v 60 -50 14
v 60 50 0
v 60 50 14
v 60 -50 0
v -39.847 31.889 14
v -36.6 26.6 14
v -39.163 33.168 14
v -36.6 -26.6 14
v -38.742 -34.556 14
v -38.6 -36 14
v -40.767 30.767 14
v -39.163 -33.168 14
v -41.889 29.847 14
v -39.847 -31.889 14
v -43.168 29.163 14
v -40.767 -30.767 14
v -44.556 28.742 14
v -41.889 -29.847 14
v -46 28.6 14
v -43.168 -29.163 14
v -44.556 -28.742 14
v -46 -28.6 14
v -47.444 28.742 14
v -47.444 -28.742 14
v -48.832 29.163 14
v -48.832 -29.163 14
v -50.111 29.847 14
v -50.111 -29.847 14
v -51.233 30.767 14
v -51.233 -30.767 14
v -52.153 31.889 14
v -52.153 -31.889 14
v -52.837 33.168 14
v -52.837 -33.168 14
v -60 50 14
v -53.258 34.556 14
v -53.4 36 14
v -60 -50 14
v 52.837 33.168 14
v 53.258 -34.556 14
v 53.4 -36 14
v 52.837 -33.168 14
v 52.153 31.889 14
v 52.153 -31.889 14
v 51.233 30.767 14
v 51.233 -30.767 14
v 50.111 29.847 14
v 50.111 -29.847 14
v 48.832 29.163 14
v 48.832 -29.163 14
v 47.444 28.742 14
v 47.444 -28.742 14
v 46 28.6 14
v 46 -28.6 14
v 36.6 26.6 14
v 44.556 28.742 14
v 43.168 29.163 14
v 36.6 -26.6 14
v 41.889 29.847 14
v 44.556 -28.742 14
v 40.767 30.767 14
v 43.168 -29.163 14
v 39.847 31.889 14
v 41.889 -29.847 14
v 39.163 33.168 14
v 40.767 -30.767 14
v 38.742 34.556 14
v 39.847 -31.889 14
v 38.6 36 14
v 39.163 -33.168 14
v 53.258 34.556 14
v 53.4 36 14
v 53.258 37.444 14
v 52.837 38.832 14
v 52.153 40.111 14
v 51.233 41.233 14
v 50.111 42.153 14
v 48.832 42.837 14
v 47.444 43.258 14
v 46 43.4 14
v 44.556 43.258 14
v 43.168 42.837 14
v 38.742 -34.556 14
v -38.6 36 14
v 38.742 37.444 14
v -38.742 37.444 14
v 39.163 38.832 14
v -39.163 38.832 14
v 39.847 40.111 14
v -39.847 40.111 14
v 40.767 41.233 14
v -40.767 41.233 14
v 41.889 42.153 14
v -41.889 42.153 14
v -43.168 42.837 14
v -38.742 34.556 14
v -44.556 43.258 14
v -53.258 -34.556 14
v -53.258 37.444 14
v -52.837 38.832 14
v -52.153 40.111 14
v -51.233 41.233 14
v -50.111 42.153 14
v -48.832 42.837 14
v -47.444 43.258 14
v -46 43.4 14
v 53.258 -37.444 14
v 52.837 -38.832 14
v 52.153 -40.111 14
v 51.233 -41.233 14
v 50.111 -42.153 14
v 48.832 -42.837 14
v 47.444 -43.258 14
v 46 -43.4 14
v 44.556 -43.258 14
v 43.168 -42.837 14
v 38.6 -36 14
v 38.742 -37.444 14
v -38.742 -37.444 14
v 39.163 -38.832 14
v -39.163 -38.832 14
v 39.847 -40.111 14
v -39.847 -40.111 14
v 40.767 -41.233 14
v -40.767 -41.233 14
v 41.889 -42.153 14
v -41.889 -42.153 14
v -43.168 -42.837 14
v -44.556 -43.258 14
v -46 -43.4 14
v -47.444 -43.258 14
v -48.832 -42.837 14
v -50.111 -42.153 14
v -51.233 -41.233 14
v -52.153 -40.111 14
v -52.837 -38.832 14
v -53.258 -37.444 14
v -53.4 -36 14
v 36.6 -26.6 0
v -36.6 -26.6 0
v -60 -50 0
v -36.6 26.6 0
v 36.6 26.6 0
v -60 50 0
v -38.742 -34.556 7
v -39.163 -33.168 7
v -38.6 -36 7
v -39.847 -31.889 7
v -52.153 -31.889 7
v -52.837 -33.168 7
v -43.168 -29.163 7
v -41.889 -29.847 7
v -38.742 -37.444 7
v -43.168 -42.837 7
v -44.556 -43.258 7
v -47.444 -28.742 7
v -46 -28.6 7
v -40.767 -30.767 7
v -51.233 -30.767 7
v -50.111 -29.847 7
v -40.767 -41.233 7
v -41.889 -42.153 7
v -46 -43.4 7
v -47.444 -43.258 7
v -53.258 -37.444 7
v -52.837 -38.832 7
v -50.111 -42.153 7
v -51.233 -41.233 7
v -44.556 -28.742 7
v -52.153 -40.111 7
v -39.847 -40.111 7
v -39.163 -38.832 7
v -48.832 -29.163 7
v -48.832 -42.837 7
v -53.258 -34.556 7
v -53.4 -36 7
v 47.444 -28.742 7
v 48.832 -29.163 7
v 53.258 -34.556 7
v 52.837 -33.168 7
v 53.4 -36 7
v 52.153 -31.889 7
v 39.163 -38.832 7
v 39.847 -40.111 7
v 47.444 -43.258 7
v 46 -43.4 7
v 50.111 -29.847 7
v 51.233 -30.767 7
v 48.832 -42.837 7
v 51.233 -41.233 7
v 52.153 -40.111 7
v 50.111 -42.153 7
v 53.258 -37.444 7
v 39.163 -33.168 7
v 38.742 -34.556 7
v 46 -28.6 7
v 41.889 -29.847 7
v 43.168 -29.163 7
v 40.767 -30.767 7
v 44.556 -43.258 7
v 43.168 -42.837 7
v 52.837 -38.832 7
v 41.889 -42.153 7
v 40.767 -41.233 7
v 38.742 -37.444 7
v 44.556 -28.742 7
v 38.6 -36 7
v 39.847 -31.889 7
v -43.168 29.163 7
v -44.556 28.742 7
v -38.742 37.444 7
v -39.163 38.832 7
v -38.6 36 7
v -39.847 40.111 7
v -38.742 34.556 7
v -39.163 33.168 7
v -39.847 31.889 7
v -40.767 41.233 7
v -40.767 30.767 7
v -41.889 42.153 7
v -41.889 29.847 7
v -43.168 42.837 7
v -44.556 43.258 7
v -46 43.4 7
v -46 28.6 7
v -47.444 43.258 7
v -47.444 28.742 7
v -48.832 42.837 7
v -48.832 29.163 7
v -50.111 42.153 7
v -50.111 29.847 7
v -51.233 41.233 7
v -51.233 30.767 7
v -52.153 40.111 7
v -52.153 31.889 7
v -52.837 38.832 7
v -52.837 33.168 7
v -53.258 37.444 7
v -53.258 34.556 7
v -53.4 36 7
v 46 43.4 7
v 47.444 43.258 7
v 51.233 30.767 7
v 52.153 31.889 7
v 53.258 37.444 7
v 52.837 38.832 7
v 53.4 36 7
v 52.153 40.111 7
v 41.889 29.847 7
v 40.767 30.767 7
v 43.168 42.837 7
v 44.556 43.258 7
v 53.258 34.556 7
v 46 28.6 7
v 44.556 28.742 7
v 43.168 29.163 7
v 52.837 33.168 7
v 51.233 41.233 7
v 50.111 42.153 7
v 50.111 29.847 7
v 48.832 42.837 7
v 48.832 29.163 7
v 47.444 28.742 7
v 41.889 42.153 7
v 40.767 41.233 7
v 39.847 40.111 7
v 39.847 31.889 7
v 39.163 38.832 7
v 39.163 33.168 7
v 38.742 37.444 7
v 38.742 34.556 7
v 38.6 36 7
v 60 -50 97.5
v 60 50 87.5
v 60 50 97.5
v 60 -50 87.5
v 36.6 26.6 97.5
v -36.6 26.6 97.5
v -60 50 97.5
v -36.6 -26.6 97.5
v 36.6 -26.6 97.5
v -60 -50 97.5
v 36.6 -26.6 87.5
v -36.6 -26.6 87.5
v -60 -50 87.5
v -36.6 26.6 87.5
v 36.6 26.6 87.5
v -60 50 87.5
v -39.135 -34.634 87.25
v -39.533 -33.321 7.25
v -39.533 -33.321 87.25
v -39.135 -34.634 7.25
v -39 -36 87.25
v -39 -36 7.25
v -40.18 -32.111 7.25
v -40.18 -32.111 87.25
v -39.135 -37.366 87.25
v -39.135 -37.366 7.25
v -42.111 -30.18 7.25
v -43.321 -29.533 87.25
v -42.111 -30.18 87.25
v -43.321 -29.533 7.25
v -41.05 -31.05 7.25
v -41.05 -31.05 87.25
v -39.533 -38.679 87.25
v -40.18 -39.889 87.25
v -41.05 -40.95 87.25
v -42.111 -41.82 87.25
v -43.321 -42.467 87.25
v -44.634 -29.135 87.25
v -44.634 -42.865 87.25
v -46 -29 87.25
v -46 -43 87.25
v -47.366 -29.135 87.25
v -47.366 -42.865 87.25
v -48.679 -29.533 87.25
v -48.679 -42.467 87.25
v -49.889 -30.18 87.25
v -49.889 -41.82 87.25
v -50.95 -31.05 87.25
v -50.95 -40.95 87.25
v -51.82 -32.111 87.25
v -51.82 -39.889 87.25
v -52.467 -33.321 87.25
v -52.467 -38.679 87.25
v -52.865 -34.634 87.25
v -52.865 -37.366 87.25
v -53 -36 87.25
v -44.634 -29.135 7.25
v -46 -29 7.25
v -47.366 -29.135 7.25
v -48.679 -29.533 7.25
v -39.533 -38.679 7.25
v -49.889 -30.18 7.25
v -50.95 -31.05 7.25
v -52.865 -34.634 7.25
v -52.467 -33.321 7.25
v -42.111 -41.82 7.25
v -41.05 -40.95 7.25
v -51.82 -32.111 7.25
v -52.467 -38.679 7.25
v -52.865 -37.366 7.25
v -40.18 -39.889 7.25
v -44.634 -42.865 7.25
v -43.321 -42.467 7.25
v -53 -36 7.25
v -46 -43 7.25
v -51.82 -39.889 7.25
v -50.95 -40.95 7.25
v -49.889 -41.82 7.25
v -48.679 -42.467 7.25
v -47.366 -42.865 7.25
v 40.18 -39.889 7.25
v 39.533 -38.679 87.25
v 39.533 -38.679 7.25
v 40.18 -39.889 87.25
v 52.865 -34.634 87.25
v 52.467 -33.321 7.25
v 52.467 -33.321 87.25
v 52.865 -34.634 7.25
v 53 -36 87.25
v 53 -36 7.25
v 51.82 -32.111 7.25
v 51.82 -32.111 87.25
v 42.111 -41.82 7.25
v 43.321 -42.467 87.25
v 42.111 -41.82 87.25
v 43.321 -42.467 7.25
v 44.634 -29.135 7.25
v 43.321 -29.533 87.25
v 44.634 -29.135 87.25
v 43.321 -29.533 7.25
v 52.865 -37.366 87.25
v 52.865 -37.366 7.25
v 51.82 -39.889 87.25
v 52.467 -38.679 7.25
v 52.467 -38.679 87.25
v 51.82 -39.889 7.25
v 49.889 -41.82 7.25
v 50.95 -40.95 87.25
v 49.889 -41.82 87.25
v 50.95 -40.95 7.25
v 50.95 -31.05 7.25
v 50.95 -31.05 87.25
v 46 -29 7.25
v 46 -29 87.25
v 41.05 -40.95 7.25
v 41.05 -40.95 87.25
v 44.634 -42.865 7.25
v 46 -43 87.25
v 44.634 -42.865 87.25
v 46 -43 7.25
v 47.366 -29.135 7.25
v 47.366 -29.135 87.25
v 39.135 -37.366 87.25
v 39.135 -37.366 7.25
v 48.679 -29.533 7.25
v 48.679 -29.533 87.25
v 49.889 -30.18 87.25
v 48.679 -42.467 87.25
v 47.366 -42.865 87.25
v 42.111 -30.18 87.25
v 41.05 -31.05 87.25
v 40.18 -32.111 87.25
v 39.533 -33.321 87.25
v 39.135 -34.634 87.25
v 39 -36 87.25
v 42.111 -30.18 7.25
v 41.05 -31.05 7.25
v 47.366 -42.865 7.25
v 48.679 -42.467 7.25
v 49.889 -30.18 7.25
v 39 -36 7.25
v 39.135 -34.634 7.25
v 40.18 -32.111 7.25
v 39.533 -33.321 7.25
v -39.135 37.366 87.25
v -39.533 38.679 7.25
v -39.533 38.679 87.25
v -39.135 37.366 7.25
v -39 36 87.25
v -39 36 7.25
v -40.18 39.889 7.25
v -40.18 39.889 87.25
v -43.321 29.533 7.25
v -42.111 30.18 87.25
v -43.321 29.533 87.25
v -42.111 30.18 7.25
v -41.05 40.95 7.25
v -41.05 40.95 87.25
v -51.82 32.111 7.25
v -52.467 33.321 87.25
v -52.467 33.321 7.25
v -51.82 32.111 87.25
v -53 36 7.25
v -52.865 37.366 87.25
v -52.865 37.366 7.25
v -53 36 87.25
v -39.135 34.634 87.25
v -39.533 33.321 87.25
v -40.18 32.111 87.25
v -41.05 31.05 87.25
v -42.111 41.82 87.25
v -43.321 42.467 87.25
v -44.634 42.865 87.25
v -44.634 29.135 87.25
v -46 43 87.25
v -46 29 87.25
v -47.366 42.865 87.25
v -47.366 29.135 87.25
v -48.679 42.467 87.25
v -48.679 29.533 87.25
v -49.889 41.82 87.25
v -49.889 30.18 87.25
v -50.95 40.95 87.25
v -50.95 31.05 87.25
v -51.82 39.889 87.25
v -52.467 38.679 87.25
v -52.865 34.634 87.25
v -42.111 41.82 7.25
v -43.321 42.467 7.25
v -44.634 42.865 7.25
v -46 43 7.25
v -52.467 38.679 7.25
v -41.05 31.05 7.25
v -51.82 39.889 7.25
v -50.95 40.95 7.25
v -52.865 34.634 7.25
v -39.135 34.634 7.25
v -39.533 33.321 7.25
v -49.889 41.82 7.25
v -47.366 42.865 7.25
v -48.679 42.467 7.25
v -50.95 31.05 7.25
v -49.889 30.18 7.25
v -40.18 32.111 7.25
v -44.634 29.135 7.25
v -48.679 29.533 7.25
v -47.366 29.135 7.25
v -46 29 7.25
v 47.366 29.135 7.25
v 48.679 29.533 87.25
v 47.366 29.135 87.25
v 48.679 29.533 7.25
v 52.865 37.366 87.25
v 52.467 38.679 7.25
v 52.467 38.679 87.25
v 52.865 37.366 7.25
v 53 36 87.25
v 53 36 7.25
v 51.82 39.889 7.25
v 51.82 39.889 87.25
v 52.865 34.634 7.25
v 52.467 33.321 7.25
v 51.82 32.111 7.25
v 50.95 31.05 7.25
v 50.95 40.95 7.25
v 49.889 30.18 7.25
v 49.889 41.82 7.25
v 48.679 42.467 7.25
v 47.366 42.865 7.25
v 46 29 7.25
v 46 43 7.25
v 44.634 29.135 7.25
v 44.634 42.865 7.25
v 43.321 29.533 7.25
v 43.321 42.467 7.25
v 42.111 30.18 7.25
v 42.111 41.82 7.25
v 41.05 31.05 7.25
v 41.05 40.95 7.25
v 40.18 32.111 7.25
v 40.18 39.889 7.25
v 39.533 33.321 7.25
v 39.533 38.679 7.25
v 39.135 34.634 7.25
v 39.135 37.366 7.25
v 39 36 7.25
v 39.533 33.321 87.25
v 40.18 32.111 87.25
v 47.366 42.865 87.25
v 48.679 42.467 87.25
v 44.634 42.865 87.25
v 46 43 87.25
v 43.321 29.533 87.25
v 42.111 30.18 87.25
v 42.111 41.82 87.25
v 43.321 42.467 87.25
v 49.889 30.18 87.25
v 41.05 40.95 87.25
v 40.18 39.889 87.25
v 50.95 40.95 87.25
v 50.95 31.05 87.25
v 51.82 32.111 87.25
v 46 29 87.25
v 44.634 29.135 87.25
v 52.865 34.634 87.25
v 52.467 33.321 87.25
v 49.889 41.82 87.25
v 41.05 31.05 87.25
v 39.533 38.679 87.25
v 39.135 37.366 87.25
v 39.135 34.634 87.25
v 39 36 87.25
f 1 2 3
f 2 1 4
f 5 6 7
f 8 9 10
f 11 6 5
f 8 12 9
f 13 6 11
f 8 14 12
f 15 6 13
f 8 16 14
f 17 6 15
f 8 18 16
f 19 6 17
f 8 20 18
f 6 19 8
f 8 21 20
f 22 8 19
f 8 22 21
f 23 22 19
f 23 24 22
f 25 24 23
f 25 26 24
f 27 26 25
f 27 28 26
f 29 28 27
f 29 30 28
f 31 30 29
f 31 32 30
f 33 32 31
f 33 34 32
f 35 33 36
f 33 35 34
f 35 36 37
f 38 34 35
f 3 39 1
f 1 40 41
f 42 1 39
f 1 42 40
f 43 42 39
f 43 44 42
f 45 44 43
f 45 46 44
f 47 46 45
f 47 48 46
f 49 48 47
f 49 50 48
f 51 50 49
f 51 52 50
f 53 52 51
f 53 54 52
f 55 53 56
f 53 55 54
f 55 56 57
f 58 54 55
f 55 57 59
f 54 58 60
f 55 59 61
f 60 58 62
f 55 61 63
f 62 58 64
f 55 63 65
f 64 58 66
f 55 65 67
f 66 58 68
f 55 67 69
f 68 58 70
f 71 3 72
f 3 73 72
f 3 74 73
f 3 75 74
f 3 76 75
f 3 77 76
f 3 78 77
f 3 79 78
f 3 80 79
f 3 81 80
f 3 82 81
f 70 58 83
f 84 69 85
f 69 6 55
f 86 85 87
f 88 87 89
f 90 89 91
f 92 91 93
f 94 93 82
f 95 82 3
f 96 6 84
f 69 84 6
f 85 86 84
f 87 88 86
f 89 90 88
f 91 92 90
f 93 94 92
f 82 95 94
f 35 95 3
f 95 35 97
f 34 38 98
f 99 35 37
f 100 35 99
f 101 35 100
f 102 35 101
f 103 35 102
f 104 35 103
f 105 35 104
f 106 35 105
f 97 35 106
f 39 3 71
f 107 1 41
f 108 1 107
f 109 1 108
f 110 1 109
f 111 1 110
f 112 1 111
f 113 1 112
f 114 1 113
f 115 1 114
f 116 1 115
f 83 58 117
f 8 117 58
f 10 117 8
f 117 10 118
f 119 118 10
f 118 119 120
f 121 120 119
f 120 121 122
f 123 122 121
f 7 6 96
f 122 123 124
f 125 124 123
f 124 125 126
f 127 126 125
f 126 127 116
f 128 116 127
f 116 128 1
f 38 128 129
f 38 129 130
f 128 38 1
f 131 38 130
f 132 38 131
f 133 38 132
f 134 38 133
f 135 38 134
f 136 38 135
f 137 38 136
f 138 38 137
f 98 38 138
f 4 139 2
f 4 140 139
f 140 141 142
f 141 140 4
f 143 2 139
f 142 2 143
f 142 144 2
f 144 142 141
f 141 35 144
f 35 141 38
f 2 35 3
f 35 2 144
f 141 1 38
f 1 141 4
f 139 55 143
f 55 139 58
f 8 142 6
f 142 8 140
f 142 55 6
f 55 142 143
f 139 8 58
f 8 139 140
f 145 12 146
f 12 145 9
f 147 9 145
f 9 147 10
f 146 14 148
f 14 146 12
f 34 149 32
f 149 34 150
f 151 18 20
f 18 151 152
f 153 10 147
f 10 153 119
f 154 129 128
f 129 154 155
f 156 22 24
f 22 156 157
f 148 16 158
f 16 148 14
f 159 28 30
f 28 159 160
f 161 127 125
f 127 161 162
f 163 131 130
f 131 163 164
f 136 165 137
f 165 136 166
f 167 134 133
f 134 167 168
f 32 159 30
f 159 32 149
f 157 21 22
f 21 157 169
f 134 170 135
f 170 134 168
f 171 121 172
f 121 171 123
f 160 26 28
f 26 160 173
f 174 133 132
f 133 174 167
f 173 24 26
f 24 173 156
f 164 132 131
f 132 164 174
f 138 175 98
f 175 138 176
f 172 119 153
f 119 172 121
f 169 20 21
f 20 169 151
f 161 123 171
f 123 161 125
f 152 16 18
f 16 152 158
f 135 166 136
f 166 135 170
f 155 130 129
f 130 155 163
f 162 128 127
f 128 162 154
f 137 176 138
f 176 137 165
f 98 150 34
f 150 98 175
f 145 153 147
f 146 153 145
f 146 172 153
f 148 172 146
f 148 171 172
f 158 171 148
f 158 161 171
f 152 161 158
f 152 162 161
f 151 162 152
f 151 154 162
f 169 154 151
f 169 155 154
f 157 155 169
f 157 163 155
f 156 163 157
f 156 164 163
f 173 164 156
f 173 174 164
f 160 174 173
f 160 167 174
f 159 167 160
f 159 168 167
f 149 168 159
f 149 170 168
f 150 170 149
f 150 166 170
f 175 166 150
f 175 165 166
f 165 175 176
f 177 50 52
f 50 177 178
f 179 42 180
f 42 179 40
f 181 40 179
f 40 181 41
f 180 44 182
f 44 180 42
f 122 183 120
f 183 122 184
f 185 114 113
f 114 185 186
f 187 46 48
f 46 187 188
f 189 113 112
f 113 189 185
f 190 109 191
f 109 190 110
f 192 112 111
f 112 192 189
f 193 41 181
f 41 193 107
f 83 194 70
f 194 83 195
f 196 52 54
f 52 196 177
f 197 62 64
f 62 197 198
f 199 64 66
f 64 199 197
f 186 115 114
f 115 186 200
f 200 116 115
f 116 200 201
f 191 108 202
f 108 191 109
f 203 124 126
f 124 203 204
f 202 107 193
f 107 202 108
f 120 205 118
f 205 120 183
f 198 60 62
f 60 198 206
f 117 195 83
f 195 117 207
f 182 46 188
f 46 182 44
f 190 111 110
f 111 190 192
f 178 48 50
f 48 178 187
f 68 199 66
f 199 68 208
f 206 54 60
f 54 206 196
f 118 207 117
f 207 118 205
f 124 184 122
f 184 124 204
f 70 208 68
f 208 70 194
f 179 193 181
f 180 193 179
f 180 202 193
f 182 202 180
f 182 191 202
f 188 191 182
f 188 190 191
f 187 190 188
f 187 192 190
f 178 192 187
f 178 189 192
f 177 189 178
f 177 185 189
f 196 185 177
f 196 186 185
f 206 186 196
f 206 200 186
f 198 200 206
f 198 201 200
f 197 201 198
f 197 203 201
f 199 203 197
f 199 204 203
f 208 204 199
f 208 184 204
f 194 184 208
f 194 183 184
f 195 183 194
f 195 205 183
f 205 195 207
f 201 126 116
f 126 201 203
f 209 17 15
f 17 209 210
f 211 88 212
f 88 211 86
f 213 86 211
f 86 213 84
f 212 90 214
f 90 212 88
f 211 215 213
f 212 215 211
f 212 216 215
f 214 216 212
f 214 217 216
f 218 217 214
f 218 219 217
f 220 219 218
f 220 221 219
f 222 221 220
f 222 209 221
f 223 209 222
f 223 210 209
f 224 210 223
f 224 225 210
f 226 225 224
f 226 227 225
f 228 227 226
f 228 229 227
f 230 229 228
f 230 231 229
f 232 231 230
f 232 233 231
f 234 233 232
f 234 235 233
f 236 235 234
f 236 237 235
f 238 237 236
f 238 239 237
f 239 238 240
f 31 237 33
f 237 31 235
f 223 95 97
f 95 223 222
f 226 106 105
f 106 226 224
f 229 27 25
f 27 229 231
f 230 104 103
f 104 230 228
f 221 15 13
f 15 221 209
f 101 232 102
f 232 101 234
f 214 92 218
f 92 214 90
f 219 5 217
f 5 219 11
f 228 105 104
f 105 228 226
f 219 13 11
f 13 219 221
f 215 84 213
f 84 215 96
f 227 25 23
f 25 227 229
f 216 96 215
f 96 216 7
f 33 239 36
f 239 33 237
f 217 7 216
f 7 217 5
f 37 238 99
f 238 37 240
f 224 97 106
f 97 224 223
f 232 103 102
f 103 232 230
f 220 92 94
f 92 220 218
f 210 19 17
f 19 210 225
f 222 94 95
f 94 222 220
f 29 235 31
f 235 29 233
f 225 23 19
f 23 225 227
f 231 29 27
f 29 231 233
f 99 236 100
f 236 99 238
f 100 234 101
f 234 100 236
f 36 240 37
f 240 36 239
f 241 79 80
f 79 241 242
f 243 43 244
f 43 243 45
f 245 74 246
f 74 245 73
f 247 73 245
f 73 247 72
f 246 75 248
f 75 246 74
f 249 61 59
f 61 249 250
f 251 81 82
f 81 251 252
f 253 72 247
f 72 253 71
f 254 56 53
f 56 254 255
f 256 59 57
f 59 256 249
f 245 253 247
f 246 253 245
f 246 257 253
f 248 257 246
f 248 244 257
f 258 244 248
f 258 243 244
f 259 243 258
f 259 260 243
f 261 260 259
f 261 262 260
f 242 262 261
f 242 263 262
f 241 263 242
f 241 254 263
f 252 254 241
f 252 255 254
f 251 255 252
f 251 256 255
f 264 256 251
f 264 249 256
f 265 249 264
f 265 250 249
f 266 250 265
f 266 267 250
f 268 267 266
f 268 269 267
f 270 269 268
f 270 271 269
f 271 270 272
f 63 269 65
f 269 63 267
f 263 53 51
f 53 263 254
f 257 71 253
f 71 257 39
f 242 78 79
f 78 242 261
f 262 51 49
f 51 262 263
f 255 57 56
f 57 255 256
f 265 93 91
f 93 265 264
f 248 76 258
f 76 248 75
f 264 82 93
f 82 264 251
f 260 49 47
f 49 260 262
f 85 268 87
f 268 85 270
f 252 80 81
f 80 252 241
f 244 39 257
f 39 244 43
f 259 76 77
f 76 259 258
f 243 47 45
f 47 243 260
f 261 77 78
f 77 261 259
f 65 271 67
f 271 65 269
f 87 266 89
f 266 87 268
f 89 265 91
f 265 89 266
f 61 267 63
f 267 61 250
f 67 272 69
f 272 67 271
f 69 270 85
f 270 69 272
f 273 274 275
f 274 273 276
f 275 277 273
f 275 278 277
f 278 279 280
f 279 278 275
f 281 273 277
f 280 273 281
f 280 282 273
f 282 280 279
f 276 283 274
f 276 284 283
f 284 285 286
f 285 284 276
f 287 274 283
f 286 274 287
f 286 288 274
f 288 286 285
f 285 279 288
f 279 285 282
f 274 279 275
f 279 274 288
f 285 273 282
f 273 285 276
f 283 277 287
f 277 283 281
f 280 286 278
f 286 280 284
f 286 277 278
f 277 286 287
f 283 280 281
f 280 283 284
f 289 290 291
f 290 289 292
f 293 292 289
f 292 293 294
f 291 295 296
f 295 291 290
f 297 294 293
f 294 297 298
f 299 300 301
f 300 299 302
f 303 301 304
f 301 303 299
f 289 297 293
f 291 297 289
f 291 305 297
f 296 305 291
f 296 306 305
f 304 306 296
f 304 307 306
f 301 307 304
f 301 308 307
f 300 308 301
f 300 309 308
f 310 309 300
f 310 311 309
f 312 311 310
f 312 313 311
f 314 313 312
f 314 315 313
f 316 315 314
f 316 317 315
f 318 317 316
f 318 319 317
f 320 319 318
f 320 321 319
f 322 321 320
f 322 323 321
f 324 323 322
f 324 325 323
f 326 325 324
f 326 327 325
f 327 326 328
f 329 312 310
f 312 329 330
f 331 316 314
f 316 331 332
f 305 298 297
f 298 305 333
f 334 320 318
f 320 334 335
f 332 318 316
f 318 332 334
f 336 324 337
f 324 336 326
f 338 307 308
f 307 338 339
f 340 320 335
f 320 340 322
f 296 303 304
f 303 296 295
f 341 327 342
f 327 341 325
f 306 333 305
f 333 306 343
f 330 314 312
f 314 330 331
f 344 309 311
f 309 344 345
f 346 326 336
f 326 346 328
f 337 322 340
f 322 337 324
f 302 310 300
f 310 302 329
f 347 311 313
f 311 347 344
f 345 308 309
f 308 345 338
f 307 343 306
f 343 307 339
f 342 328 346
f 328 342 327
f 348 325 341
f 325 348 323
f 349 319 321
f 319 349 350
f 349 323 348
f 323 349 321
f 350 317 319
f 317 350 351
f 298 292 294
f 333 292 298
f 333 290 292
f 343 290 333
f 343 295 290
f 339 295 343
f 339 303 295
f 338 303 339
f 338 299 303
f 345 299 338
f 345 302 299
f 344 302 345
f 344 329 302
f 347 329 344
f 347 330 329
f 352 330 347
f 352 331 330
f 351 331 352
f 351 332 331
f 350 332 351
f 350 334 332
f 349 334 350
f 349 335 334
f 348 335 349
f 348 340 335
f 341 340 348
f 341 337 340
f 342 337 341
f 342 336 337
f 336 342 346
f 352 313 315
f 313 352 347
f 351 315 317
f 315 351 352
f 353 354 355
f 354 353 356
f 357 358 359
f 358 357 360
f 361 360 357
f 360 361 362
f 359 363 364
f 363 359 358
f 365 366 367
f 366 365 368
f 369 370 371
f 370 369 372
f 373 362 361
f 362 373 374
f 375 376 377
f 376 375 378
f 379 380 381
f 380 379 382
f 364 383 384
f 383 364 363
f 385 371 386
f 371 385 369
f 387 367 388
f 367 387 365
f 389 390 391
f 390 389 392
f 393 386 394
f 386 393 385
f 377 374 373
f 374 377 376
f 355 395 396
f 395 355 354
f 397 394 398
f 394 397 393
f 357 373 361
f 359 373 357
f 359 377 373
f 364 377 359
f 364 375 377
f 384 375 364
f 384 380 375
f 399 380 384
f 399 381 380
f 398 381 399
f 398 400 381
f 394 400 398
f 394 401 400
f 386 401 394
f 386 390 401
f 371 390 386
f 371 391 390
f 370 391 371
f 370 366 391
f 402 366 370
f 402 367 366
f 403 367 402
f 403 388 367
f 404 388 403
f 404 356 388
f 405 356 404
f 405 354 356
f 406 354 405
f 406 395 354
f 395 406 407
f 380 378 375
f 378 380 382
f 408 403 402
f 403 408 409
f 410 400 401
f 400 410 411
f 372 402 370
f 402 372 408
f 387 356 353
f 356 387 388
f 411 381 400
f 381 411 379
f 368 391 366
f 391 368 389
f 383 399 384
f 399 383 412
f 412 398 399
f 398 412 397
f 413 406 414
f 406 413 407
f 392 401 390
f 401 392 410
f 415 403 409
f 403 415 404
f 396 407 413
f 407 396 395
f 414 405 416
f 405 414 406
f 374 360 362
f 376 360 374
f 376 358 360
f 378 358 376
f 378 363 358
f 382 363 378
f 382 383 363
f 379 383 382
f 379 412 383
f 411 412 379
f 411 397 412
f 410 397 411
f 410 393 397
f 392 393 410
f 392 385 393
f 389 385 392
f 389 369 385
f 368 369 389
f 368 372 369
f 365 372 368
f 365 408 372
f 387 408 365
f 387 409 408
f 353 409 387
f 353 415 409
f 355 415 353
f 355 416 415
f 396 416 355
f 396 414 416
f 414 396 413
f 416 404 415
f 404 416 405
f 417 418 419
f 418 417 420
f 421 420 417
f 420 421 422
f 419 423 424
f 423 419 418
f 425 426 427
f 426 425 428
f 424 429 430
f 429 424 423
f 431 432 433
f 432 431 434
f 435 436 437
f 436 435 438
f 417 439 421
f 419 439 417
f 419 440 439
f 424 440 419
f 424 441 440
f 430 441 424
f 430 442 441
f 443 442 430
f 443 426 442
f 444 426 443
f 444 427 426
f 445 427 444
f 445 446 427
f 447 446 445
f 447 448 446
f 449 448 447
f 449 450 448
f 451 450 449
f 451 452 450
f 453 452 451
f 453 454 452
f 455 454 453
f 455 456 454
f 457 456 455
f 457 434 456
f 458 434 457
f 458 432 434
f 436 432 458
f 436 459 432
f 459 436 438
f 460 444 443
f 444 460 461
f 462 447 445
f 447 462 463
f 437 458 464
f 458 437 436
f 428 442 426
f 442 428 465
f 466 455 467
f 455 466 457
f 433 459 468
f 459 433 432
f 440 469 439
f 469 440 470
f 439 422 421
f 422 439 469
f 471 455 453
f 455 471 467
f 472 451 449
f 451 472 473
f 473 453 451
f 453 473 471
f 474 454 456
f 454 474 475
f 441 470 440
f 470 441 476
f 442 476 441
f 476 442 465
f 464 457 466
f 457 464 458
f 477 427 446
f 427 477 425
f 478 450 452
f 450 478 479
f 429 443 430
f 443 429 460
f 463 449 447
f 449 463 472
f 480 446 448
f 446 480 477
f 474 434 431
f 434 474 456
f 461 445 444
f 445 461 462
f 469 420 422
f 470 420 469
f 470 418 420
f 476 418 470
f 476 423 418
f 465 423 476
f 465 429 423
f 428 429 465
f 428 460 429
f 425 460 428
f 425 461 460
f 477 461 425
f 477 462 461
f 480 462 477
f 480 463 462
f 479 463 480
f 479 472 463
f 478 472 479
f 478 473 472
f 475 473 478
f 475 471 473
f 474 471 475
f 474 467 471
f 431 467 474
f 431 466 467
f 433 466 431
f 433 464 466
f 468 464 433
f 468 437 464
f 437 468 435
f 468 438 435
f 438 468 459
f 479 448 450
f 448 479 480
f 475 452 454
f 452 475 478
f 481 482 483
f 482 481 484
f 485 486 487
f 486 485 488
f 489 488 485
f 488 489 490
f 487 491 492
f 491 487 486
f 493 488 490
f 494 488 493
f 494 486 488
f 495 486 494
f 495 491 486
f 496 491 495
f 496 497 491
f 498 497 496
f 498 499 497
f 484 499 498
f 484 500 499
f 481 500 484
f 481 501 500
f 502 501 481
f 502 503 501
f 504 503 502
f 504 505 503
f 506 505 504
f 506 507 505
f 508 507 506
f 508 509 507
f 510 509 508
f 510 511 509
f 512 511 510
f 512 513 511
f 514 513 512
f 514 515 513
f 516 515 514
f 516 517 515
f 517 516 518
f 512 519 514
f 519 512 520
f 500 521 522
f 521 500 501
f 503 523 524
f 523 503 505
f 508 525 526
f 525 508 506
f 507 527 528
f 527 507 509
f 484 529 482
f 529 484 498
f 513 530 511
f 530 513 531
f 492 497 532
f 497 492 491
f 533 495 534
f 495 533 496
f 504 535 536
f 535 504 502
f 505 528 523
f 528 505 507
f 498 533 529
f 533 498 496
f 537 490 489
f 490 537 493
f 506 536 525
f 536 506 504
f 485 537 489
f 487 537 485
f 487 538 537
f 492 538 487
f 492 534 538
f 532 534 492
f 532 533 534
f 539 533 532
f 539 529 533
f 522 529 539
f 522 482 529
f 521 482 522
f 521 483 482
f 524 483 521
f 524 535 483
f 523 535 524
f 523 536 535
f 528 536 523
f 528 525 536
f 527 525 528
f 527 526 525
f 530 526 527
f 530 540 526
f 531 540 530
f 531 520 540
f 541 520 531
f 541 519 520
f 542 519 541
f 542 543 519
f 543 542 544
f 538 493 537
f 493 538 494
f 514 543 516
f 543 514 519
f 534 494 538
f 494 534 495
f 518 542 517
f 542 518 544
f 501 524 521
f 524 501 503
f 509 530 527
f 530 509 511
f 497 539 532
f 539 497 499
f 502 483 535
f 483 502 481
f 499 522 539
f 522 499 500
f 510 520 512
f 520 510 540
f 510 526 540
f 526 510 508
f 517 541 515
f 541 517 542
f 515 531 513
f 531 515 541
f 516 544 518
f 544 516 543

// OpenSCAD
$fn = 32;

// ------------------------------------------------------------------------
// Frame cube: base 120 x 100 mm, posts 80 mm tall
// Every part is its own module, assembly() places every instance.
// ------------------------------------------------------------------------

// --- part 1 ---
module base_frame() {
  difference() {
    translate([-60, -50, 0]) cube([120, 100, 14]);
    translate([-36.6, -26.6, -1]) cube([73.2, 53.2, 16]);
    translate([-46, -36, 7]) cylinder(h = 8, d = 14.8);
    translate([46, -36, 7]) cylinder(h = 8, d = 14.8);
    translate([-46, 36, 7]) cylinder(h = 8, d = 14.8);
    translate([46, 36, 7]) cylinder(h = 8, d = 14.8);
  }
}

// --- part 2 ---
module corner_post() {
  cylinder(h = 80, d = 14);
}

// --- part 3 ---
module top_frame() {
  difference() {
    translate([-60, -50, 0]) cube([120, 100, 10]);
    translate([-36.6, -26.6, -1]) cube([73.2, 53.2, 12]);
  }
}

// --- assembly ---
module assembly() {
  color([0.80, 0.24, 0.20]) translate([0, 0, 0]) rotate([0, 0, 0]) base_frame();
  color([0.20, 0.45, 0.75]) translate([-46, -36, 7.25]) rotate([0, 0, 0]) corner_post();
  color([0.25, 0.62, 0.32]) translate([46, -36, 7.25]) rotate([0, 0, 0]) corner_post();
  color([0.92, 0.70, 0.18]) translate([-46, 36, 7.25]) rotate([0, 0, 0]) corner_post();
  color([0.58, 0.35, 0.70]) translate([46, 36, 7.25]) rotate([0, 0, 0]) corner_post();
  color([0.16, 0.66, 0.66]) translate([0, 0, 87.5]) rotate([0, 0, 0]) top_frame();
}

assembly();
